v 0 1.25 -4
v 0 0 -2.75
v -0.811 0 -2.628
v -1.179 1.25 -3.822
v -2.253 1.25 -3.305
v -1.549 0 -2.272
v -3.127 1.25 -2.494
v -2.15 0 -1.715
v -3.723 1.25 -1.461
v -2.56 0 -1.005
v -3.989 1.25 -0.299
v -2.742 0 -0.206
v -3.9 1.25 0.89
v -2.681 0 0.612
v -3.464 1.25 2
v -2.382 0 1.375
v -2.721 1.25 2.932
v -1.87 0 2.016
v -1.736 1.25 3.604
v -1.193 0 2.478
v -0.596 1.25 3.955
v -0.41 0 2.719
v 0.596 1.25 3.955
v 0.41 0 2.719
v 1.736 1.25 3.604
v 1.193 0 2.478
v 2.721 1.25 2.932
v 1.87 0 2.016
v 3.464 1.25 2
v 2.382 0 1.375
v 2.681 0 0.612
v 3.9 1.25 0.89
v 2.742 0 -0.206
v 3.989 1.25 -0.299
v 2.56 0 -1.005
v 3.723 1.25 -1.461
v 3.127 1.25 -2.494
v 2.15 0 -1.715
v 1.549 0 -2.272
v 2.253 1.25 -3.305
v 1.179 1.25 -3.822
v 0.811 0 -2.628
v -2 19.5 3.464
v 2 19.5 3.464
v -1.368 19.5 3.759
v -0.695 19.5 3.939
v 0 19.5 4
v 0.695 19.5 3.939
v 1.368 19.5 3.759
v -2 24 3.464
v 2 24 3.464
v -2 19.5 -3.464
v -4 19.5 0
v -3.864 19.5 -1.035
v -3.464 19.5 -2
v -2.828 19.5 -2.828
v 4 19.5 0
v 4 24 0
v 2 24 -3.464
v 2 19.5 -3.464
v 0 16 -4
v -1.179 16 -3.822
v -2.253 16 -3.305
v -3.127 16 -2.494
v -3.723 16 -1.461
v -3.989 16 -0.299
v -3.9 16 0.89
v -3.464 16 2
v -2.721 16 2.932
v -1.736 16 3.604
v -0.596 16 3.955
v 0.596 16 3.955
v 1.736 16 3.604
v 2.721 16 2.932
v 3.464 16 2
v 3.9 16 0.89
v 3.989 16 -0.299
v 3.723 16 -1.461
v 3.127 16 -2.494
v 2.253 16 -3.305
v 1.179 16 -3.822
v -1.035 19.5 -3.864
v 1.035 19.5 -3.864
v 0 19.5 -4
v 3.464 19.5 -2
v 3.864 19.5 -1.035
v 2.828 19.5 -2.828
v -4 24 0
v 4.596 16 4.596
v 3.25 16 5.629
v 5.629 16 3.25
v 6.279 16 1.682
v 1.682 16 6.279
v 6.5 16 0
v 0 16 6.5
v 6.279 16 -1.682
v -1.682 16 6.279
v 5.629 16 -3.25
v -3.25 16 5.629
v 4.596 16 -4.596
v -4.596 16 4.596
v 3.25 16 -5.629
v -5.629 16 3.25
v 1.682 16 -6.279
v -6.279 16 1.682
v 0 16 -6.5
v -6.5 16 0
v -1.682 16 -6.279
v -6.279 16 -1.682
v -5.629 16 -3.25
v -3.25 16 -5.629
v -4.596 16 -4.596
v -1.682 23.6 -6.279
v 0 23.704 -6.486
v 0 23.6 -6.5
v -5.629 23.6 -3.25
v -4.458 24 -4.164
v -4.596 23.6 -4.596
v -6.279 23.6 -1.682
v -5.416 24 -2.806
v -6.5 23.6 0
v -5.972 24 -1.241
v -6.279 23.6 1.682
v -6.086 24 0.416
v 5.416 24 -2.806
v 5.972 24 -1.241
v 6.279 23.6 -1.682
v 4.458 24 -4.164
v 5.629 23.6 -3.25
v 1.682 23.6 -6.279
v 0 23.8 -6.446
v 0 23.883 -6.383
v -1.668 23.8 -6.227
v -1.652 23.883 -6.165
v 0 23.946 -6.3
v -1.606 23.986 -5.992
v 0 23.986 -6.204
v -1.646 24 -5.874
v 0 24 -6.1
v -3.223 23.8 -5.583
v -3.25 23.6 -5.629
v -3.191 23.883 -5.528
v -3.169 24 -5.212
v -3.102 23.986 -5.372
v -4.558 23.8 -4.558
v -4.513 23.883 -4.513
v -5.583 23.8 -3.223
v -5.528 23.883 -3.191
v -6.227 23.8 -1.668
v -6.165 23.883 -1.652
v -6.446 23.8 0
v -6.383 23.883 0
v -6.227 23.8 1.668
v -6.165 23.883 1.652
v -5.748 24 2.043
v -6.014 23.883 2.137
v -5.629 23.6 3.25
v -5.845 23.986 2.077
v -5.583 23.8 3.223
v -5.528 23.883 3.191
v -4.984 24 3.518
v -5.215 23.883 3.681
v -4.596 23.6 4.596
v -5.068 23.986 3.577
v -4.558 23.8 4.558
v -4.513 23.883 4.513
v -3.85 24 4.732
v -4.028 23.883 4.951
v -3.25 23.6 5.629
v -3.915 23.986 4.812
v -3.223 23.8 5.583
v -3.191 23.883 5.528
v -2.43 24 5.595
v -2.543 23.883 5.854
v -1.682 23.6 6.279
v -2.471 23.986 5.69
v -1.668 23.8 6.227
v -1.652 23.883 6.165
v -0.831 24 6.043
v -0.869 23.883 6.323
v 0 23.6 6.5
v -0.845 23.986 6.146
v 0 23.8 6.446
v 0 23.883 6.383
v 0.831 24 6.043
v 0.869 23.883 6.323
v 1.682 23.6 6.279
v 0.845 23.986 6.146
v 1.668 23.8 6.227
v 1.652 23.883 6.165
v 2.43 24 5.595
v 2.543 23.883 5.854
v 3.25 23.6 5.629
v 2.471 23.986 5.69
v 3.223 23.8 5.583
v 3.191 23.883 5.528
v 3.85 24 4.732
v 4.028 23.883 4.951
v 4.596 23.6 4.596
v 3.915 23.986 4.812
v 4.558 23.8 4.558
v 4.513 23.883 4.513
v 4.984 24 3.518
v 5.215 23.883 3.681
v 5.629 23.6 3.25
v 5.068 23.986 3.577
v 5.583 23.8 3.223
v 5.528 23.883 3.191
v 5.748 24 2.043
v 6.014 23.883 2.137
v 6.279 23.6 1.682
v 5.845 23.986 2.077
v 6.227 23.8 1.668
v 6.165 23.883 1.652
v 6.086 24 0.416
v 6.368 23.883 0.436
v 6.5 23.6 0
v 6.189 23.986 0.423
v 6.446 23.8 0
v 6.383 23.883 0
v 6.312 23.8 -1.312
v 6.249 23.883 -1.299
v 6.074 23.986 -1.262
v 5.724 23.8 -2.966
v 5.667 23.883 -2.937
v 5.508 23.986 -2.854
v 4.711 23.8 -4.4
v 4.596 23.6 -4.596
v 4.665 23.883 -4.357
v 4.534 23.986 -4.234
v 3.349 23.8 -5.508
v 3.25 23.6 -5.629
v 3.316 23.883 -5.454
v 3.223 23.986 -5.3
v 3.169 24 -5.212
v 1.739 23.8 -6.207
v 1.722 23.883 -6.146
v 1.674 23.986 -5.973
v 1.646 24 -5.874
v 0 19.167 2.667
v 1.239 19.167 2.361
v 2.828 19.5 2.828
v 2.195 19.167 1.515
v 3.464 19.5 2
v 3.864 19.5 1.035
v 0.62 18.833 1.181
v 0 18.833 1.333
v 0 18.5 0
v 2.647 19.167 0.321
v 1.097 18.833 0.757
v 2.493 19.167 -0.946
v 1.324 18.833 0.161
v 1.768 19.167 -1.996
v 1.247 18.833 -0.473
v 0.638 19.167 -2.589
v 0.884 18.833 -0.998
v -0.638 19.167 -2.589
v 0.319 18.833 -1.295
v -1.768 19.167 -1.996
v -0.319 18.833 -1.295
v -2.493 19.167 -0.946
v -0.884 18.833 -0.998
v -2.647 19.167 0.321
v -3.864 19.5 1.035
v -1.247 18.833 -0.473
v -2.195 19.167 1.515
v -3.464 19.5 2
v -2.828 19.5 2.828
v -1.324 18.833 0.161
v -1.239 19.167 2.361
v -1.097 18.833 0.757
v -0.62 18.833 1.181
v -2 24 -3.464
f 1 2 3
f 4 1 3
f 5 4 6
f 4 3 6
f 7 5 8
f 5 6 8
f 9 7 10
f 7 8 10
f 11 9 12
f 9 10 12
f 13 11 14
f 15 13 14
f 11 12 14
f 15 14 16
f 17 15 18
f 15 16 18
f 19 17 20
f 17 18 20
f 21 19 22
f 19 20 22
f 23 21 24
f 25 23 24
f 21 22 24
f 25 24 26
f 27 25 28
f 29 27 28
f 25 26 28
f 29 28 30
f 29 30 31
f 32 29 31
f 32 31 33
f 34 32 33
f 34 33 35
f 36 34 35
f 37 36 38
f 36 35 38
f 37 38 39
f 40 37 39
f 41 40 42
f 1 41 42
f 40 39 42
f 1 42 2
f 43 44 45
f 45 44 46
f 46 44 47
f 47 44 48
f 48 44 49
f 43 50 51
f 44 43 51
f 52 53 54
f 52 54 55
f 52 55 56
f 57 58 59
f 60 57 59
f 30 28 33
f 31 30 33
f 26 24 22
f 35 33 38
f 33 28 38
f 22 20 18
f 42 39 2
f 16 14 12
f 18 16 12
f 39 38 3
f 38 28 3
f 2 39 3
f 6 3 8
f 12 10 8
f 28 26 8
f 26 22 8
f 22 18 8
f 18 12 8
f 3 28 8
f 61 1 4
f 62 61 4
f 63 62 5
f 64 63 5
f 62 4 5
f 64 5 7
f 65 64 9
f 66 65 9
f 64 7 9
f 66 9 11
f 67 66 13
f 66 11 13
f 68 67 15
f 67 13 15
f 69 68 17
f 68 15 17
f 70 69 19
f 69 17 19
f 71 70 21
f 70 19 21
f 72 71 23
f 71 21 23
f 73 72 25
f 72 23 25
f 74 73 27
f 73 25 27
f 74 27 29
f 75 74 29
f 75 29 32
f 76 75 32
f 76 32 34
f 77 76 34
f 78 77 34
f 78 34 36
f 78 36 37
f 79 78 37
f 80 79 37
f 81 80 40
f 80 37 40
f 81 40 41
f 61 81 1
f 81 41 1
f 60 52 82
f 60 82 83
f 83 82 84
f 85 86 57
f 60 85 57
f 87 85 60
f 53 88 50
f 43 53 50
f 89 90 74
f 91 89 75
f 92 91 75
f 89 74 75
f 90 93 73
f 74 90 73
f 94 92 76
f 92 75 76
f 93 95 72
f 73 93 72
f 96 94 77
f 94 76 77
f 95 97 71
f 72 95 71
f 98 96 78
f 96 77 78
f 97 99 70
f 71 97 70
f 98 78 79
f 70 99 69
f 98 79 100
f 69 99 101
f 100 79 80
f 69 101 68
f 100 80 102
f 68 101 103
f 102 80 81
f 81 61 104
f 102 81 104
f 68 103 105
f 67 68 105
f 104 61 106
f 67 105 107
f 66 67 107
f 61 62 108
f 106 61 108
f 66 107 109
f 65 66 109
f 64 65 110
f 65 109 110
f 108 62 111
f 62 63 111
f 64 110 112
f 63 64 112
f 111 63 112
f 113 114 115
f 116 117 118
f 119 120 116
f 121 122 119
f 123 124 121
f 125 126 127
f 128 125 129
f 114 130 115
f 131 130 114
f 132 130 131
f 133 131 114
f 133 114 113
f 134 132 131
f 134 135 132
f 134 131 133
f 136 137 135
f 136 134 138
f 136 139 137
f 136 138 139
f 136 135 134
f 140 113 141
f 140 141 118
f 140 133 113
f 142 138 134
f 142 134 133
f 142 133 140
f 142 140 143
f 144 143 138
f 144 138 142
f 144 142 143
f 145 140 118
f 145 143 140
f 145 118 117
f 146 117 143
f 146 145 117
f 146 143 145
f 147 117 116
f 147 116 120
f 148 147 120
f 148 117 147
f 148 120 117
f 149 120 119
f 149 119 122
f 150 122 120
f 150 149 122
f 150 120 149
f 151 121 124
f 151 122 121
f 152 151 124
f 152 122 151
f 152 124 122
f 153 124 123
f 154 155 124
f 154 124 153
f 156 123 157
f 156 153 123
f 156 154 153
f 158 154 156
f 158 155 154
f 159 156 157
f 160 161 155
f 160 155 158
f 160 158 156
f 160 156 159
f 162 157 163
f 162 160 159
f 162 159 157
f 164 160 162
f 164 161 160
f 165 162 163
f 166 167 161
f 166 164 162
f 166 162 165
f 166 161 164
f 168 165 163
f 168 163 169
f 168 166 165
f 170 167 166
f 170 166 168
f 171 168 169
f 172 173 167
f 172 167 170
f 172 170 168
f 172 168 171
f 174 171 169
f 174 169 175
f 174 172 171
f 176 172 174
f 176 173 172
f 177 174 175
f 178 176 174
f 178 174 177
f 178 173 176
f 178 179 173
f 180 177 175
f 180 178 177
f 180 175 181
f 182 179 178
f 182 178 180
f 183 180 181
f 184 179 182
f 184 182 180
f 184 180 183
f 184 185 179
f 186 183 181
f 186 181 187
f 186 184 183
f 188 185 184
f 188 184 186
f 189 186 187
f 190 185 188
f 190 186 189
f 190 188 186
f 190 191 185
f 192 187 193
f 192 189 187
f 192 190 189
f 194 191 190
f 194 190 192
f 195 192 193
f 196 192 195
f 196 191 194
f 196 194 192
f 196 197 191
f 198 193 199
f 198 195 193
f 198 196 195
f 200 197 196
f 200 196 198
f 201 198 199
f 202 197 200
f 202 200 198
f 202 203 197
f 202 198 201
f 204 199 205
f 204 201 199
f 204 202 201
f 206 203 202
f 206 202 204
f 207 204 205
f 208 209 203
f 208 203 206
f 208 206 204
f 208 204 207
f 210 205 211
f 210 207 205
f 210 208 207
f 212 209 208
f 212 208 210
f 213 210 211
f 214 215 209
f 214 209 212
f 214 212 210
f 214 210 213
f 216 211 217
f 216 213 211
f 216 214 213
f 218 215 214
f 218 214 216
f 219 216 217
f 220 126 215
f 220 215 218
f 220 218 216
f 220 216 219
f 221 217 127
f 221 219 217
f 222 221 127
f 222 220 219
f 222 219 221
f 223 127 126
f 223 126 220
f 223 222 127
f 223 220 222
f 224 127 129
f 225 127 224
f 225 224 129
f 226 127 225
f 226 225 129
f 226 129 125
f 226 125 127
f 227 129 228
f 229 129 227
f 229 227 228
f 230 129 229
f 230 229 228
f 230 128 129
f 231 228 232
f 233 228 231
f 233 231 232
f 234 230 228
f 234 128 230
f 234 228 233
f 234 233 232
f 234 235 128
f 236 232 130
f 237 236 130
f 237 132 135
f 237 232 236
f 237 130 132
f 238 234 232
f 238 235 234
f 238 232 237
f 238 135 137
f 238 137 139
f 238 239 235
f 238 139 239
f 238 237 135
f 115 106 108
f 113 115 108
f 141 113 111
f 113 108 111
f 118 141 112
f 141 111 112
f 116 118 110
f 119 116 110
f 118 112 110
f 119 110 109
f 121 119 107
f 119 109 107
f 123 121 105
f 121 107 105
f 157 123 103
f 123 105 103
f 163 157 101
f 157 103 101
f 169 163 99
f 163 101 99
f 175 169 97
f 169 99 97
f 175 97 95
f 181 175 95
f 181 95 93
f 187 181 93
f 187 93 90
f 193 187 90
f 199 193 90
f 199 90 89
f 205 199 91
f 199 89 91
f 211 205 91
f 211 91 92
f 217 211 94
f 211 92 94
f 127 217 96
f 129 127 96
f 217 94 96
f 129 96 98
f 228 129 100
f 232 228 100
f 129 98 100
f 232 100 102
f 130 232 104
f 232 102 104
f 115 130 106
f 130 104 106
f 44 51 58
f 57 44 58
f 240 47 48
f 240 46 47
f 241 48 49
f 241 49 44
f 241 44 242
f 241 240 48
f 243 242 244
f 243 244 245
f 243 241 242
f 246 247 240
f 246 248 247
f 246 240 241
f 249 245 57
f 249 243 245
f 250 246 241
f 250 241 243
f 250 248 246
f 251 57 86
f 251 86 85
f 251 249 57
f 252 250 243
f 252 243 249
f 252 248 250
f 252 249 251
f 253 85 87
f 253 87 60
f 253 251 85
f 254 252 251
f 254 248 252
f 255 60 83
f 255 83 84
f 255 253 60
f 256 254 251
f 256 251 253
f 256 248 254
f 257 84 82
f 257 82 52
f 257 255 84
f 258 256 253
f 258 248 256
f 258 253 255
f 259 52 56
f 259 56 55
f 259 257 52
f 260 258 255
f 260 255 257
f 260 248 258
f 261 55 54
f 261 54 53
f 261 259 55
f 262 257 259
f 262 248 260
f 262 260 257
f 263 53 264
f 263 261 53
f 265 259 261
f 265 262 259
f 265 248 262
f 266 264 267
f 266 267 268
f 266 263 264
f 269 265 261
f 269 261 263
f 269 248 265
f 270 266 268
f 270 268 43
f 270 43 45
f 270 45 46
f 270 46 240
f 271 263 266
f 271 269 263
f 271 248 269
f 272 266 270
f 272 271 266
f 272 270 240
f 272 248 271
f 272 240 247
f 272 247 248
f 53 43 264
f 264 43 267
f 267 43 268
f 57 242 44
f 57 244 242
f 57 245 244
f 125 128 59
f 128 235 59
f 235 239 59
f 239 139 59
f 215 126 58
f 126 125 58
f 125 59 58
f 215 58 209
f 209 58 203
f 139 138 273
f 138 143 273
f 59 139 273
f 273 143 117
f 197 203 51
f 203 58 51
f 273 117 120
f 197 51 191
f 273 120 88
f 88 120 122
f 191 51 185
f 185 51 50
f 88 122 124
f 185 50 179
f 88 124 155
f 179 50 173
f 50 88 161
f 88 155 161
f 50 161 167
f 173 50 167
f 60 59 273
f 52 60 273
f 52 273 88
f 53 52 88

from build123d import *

# Parameters (mm, degrees)
CHAMFER1_SIZE      = 1.25
FILLET1_R          = 0.4
CUT_EXTRUDE1_DEPTH = 4.5


with BuildPart() as part:
    # Sketch1 → Revolve1 (revolve)
    with BuildSketch(Plane.XY, mode=Mode.PRIVATE) as revolve1_sk:
        Polygon((0, 0), (0, 24), (-6.5, 24), (-6.5, 16), (-4, 16), (-4, 0), align=None)
    revolve(revolve1_sk.sketch.rotate(Axis((0, 0, 0), (0, 1, 0)), 270), axis=Axis((0, 0, 0), (0, 1, 0)))

    # Chamfer1
    chamfer1_edges = [part.edges().sort_by_distance(p)[0] for p in [
        (0, 0, 4),
    ]]
    chamfer(chamfer1_edges, length=CHAMFER1_SIZE)

    # Fillet1
    fillet1_edges = [part.edges().sort_by_distance(p)[0] for p in [
        (0, 24, 6.5),
    ]]
    fillet(fillet1_edges, radius=FILLET1_R)

    # Sketch2 → Cut-Extrude1 (cut)
    with BuildSketch(Plane(origin=(0, 24, 0), x_dir=(1, 0, 0), z_dir=(0, 1, 0))):
        Polygon((-4, 0), (-2, -3.464101615), (2, -3.464101615), (4, 0), (2, 3.464101615), (-2, 3.464101615), align=None)
    extrude(amount=-CUT_EXTRUDE1_DEPTH, mode=Mode.SUBTRACT)

    # Sketch3 → Cut-Revolve1 (revolve, cut)
    with BuildSketch(Plane.XY, mode=Mode.PRIVATE) as cut_revolve1_sk:
        Polygon((4, 19.5), (0, 18.5), (0, 19.5), align=None)
    revolve(cut_revolve1_sk.sketch.rotate(Axis((0, 18.5, 0), (0, 1, 0)), 270), axis=Axis((0, 18.5, 0), (0, 1, 0)), mode=Mode.SUBTRACT)


solid = part.part
